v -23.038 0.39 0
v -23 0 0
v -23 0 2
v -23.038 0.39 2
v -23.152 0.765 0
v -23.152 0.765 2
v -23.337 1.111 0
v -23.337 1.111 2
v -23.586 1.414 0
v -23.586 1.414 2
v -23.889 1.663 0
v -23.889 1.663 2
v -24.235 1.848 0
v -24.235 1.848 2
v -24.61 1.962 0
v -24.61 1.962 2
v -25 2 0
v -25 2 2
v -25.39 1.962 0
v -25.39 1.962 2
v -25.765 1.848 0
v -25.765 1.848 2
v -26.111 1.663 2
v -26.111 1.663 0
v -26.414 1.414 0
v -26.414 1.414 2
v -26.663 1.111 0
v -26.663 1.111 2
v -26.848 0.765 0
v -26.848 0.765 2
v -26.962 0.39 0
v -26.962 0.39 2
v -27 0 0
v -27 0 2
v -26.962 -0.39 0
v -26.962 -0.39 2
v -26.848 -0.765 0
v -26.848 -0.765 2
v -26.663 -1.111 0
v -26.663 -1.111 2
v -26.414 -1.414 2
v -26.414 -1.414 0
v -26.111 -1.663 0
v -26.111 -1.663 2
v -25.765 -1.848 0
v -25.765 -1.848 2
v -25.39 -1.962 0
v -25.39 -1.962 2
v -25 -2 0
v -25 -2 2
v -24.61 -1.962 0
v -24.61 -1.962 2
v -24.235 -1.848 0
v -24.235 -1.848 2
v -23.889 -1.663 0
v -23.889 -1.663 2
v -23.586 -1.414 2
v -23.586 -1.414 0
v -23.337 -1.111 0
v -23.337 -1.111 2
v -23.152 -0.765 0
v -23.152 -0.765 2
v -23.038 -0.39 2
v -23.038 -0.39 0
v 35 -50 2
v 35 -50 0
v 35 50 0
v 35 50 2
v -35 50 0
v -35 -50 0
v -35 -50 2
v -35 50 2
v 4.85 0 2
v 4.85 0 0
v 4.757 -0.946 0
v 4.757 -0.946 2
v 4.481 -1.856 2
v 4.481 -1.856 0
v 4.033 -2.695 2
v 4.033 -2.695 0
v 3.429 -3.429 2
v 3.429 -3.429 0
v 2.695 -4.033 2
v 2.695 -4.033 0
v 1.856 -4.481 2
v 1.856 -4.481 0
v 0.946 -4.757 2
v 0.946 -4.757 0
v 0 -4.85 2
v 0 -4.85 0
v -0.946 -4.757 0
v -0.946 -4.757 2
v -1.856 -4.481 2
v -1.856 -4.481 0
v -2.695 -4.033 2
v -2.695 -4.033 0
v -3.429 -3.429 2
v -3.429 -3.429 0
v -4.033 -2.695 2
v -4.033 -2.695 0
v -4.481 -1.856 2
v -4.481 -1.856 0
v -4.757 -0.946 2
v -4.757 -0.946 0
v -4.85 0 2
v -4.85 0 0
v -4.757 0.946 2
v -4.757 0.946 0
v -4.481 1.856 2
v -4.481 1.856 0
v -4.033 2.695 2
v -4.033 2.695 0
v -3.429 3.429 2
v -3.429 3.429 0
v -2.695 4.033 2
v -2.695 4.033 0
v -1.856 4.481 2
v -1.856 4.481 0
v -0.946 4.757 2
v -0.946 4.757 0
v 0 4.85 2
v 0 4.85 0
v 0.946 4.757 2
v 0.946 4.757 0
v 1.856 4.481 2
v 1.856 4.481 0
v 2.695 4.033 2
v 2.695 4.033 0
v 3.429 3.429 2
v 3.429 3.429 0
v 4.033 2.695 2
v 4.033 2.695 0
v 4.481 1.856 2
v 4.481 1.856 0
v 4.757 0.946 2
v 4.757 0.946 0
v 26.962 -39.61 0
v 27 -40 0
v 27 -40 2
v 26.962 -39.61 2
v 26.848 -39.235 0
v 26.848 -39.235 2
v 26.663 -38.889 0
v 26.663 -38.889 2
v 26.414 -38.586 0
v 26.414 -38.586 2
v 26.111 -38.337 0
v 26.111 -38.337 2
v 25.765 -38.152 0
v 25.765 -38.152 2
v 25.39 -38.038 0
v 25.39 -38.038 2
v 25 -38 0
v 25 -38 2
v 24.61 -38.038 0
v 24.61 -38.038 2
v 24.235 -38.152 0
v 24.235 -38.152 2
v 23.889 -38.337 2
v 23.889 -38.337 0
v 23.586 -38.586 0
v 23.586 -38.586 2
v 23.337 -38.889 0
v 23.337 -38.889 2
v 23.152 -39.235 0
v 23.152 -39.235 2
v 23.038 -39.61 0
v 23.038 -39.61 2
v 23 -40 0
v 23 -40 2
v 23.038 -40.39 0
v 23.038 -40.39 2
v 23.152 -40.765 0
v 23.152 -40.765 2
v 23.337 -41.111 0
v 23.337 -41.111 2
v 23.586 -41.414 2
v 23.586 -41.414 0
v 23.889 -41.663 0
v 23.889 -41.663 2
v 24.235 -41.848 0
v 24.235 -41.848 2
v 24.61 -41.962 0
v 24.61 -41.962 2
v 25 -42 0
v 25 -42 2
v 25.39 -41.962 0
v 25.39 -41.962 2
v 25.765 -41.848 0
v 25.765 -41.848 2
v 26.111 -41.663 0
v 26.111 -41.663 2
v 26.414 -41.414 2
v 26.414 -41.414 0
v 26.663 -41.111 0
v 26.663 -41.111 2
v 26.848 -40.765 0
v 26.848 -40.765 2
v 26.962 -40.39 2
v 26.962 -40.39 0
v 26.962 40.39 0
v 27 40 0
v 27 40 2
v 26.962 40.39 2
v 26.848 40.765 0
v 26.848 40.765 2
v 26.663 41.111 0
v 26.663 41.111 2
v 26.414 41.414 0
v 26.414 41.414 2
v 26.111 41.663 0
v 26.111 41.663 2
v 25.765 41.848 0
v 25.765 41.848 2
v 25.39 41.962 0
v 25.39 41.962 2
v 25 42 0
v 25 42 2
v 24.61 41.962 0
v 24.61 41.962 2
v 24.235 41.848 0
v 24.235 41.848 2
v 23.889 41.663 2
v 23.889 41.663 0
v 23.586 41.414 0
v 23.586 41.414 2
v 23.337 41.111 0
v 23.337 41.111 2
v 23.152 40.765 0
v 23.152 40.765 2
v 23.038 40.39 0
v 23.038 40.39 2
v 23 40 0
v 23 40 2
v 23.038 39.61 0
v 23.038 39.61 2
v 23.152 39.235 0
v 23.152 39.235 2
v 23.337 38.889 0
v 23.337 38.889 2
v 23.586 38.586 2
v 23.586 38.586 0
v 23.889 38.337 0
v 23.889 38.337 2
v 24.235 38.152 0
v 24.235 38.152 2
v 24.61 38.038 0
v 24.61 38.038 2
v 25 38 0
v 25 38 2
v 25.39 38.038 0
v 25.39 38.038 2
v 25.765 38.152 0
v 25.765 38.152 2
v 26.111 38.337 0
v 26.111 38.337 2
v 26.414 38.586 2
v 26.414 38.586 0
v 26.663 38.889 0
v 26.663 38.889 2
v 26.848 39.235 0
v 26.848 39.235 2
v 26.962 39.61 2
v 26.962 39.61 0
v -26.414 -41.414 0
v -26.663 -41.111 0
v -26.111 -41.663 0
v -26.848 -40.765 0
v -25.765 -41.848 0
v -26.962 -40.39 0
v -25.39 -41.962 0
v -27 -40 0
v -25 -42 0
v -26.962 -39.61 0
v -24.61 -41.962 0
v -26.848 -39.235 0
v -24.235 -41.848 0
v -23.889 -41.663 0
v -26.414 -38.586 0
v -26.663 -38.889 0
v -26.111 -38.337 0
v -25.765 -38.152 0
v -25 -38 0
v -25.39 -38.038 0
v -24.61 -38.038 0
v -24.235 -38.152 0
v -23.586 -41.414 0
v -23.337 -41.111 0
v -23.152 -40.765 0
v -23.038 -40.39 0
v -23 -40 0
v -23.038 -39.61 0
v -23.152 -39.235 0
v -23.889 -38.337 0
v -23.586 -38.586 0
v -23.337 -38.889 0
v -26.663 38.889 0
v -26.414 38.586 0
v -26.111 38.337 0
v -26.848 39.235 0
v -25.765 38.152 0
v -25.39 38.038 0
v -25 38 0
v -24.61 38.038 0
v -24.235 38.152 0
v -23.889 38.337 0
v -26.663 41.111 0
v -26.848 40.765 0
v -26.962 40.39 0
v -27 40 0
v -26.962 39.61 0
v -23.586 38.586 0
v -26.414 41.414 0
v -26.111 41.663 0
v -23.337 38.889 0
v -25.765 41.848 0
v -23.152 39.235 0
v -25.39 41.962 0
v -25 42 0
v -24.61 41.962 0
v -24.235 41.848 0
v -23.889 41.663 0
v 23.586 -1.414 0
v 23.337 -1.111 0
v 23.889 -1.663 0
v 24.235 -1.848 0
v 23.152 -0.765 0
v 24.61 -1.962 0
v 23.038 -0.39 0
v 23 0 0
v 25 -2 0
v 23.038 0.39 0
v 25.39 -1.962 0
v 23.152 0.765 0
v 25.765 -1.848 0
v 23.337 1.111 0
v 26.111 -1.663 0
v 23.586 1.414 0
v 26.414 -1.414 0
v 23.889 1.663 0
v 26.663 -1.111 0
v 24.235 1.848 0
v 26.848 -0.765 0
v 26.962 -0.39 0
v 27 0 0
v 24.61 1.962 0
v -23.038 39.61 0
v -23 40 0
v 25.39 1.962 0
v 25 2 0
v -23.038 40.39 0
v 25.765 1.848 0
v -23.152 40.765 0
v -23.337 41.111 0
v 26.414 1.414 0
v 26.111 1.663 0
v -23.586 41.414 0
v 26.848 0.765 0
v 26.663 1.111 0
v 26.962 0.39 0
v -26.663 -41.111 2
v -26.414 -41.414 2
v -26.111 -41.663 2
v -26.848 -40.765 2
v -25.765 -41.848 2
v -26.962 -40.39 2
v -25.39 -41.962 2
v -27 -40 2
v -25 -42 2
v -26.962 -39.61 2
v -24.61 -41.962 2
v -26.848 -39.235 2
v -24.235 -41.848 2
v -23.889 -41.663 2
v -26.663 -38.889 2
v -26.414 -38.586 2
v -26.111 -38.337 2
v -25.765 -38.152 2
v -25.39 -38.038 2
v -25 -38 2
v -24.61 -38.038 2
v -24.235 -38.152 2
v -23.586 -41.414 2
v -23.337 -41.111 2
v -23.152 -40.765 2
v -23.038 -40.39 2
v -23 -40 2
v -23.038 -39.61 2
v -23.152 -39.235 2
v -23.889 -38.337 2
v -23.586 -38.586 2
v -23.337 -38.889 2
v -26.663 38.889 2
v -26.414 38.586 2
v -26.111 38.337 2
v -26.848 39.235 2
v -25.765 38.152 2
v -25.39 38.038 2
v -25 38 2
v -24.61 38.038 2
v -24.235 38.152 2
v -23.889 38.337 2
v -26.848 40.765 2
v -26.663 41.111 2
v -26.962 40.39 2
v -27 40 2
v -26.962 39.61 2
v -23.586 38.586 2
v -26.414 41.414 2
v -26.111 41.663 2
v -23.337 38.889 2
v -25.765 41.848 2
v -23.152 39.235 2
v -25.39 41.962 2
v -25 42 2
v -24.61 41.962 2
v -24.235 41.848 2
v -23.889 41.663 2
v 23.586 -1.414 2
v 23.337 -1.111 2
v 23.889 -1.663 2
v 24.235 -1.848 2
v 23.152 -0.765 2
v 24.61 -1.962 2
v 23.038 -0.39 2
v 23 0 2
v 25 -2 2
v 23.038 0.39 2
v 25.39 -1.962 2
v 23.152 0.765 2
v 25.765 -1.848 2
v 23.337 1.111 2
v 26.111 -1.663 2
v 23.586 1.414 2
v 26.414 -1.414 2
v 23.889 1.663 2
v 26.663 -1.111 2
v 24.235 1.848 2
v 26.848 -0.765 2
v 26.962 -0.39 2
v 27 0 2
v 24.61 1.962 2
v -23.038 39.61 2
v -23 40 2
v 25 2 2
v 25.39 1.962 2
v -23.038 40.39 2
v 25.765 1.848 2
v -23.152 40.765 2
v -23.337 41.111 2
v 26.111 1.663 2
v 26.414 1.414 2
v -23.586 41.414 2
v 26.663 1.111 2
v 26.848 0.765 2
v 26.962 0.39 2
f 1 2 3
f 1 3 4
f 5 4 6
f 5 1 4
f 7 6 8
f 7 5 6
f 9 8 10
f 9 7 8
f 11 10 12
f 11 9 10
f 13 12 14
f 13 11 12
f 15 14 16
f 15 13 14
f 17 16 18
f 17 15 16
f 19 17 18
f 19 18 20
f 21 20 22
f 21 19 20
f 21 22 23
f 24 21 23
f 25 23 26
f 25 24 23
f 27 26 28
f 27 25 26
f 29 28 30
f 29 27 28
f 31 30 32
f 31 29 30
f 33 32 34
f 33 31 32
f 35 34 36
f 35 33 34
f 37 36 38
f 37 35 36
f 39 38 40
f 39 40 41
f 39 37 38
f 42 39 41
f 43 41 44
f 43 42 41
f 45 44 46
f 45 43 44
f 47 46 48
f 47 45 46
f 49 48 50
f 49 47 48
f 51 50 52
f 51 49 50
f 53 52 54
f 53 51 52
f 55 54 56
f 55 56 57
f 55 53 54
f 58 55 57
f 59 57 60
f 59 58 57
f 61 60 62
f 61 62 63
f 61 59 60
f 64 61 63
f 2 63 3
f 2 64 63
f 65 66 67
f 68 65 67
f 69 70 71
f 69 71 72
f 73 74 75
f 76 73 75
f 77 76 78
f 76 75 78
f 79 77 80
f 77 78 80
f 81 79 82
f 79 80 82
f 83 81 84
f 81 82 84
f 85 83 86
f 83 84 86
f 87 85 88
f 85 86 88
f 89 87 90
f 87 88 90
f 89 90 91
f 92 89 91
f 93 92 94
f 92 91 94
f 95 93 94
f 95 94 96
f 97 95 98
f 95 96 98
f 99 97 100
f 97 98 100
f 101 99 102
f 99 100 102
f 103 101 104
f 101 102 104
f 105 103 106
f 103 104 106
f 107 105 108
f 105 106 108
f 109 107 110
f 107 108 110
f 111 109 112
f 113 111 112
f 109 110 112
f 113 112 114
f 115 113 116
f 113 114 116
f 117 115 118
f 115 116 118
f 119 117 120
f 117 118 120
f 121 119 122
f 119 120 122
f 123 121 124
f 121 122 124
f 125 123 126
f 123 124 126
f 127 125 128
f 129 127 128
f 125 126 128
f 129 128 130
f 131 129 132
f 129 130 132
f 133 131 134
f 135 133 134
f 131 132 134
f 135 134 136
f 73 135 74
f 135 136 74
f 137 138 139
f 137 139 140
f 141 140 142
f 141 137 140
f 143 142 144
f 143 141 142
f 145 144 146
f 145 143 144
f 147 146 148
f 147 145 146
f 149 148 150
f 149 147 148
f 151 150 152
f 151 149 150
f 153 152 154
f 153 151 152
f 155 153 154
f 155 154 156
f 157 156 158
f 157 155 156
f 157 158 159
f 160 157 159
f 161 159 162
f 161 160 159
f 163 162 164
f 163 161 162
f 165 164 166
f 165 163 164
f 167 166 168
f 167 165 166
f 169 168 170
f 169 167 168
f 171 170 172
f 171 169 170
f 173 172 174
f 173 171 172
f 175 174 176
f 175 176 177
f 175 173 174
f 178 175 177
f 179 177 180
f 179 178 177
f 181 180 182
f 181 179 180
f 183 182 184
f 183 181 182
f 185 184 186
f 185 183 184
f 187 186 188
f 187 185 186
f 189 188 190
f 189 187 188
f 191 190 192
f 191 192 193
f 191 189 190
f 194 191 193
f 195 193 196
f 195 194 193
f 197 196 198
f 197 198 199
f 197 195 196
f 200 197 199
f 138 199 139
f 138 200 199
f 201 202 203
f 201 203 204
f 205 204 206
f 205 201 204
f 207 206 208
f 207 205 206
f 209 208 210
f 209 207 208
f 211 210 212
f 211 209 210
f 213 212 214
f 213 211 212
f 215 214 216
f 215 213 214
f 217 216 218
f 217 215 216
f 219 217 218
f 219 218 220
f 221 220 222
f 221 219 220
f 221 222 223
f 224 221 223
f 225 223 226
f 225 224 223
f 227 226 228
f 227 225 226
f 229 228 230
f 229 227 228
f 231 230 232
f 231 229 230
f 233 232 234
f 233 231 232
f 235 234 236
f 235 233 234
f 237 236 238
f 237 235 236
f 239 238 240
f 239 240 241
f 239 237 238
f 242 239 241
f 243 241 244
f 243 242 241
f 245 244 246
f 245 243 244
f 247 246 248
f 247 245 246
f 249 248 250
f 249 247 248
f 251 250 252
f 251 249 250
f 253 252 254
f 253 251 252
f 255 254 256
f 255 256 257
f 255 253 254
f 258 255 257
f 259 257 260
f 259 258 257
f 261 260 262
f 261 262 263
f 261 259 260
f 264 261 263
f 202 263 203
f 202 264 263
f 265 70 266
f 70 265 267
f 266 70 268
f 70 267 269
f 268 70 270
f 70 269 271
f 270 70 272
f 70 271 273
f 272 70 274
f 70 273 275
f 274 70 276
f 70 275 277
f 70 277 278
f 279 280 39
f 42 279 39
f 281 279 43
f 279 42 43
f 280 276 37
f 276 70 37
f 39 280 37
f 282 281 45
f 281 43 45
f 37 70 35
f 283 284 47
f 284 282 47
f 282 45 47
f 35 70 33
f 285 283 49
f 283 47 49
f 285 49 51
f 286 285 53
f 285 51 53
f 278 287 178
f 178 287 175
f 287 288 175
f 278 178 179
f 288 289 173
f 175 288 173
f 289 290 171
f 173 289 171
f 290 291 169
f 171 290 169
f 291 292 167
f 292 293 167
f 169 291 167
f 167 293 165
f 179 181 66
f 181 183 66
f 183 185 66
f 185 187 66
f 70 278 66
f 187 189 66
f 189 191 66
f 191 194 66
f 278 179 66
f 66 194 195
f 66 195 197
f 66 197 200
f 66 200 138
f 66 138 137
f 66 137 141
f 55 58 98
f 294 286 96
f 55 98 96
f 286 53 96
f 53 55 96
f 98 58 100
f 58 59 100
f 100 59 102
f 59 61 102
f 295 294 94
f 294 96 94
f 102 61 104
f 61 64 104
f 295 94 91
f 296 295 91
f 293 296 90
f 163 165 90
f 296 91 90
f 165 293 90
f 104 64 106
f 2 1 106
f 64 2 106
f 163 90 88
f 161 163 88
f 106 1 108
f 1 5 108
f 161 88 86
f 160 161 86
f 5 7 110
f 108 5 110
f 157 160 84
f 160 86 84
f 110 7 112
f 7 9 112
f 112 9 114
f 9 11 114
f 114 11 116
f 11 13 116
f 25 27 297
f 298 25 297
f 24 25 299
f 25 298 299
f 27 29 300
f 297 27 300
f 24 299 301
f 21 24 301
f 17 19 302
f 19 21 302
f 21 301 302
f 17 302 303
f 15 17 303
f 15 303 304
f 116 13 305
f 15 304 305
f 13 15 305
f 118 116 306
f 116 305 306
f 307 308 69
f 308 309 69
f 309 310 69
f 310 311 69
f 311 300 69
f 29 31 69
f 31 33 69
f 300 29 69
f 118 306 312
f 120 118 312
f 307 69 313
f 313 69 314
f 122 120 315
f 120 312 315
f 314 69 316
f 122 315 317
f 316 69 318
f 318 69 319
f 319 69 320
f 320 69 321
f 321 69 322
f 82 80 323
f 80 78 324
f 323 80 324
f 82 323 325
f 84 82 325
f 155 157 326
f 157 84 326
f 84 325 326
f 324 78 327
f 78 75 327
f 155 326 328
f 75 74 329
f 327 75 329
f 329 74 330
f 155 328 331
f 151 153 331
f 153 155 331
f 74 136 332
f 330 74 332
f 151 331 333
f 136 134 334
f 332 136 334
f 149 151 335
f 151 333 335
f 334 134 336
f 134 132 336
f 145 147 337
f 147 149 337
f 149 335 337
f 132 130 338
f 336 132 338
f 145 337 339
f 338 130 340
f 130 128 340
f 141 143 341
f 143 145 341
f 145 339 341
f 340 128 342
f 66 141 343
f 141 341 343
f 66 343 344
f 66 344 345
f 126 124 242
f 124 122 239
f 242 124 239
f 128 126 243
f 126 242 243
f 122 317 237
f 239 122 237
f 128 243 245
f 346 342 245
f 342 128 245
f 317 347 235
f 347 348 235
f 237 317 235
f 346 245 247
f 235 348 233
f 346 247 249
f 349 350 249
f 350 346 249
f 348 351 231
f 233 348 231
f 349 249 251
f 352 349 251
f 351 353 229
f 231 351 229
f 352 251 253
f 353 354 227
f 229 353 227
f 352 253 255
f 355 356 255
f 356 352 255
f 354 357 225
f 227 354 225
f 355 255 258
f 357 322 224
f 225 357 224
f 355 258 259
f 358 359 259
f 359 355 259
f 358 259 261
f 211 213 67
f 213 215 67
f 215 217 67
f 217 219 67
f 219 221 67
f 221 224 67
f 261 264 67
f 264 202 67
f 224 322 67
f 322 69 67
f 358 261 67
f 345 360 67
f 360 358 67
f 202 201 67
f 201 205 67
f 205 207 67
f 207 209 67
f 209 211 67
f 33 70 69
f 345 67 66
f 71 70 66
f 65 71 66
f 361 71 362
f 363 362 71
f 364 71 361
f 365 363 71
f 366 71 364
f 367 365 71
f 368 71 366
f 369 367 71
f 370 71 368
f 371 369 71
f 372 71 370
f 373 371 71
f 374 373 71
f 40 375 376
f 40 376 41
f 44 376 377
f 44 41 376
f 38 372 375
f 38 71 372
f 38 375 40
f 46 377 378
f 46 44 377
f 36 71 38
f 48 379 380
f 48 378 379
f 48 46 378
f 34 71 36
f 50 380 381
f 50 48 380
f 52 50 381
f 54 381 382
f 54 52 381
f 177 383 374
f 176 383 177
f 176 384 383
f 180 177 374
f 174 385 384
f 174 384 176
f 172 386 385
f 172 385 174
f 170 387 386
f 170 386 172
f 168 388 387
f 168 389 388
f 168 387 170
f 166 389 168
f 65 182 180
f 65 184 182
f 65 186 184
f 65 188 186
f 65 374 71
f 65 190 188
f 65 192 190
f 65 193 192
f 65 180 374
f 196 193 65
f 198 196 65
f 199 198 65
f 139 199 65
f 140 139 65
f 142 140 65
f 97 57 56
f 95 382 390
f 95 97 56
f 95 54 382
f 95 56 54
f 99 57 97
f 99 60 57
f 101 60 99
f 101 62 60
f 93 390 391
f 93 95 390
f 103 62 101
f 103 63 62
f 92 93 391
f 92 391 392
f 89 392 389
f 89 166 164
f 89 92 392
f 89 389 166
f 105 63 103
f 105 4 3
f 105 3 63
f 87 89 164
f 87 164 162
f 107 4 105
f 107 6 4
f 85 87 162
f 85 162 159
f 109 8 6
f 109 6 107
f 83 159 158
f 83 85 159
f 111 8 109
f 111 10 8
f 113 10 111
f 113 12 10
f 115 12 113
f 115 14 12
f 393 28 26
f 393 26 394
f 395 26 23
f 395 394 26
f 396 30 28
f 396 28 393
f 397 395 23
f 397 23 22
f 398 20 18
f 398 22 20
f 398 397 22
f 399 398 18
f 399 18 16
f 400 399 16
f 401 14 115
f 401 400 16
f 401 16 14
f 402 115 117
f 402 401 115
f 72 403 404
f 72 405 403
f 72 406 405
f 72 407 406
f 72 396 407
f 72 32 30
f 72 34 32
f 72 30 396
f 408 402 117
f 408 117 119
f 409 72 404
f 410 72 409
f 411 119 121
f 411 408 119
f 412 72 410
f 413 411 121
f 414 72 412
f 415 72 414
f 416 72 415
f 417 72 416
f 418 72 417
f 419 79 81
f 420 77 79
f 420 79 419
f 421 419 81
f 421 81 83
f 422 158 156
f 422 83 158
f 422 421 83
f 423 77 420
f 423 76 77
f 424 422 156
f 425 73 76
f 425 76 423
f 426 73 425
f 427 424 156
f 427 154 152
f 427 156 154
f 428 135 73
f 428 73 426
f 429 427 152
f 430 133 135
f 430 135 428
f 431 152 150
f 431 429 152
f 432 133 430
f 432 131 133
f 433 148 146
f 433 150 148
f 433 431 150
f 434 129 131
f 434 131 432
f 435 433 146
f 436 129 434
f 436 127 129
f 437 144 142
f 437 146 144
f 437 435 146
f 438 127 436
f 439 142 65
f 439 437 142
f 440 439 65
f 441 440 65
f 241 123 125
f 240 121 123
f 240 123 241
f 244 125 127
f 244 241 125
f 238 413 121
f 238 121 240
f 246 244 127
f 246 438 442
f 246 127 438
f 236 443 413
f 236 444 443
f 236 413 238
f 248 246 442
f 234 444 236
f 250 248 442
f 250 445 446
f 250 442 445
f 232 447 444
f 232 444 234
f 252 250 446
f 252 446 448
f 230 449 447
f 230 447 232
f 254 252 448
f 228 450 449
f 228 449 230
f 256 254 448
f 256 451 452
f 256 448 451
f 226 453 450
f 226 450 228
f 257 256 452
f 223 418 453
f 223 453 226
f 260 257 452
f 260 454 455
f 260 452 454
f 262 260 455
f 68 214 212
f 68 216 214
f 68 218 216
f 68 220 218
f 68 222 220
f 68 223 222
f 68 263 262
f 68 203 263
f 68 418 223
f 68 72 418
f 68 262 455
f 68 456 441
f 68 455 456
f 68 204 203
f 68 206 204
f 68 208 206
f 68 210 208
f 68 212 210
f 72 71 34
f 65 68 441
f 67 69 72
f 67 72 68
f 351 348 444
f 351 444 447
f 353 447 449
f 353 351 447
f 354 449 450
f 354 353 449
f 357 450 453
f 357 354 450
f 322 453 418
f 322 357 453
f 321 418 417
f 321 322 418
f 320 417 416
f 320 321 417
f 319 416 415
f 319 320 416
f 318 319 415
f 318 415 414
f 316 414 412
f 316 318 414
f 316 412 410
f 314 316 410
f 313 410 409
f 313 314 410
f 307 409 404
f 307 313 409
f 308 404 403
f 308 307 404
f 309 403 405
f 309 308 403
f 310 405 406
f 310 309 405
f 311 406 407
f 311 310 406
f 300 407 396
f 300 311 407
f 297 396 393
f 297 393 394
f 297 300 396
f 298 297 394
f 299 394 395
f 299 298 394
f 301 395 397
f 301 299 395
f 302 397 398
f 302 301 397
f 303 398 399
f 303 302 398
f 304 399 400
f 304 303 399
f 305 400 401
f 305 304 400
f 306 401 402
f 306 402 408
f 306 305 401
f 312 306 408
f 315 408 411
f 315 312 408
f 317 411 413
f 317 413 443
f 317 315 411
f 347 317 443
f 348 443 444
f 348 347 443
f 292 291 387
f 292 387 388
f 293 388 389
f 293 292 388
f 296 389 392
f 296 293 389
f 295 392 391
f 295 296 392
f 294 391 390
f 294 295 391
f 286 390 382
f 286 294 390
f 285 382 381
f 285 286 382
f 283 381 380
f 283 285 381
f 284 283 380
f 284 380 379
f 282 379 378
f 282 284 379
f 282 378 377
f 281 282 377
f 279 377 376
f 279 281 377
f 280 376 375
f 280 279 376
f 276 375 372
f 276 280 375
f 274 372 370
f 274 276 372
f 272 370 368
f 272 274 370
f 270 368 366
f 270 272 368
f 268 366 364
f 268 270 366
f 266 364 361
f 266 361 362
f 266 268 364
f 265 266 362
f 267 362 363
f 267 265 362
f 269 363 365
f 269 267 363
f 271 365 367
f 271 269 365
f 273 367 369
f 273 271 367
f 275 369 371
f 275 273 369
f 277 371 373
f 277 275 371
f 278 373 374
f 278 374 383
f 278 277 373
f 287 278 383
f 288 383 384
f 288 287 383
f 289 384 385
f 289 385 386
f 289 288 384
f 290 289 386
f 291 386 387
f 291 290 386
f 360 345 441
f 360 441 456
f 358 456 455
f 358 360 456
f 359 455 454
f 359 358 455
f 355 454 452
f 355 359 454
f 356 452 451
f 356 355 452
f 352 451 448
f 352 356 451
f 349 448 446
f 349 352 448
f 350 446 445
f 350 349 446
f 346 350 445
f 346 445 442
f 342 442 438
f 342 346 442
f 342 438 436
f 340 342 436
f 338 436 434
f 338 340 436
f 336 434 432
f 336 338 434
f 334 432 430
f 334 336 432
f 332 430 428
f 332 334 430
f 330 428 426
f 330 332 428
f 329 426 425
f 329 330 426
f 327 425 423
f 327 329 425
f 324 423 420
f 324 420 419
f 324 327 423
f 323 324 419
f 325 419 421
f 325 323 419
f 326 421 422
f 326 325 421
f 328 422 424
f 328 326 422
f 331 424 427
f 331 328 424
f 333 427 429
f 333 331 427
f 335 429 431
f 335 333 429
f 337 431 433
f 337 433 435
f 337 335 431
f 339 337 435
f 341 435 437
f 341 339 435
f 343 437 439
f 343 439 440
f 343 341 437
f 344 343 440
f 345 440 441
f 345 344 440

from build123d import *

# Parameters (mm, degrees)
F0_W     = 70
F0_H     = 100
F0_R     = 2
F1_DEPTH = 2


with BuildPart() as f1:
    # F0 (on Top) → F1 (new body)
    with BuildSketch(Plane.XY):
        Rectangle(F0_W, F0_H)
        with Locations((-25, -40)):
            Circle(F0_R, mode=Mode.SUBTRACT)
        with Locations((25, -40)):
            Circle(F0_R, mode=Mode.SUBTRACT)
        with Locations((-25, 0)):
            Circle(F0_R, mode=Mode.SUBTRACT)
        with Locations((-25, 40)):
            Circle(F0_R, mode=Mode.SUBTRACT)
        with BuildLine():
            ThreePointArc((-4.85, 0), (0, 4.85), (4.85, 0))
            ThreePointArc((4.85, 0), (0, -4.85), (-4.85, 0))
        make_face(mode=Mode.SUBTRACT)
        with Locations((25, 0)):
            Circle(F0_R, mode=Mode.SUBTRACT)
        with Locations((25, 40)):
            Circle(F0_R, mode=Mode.SUBTRACT)
    extrude(amount=F1_DEPTH)


solid = f1.part
